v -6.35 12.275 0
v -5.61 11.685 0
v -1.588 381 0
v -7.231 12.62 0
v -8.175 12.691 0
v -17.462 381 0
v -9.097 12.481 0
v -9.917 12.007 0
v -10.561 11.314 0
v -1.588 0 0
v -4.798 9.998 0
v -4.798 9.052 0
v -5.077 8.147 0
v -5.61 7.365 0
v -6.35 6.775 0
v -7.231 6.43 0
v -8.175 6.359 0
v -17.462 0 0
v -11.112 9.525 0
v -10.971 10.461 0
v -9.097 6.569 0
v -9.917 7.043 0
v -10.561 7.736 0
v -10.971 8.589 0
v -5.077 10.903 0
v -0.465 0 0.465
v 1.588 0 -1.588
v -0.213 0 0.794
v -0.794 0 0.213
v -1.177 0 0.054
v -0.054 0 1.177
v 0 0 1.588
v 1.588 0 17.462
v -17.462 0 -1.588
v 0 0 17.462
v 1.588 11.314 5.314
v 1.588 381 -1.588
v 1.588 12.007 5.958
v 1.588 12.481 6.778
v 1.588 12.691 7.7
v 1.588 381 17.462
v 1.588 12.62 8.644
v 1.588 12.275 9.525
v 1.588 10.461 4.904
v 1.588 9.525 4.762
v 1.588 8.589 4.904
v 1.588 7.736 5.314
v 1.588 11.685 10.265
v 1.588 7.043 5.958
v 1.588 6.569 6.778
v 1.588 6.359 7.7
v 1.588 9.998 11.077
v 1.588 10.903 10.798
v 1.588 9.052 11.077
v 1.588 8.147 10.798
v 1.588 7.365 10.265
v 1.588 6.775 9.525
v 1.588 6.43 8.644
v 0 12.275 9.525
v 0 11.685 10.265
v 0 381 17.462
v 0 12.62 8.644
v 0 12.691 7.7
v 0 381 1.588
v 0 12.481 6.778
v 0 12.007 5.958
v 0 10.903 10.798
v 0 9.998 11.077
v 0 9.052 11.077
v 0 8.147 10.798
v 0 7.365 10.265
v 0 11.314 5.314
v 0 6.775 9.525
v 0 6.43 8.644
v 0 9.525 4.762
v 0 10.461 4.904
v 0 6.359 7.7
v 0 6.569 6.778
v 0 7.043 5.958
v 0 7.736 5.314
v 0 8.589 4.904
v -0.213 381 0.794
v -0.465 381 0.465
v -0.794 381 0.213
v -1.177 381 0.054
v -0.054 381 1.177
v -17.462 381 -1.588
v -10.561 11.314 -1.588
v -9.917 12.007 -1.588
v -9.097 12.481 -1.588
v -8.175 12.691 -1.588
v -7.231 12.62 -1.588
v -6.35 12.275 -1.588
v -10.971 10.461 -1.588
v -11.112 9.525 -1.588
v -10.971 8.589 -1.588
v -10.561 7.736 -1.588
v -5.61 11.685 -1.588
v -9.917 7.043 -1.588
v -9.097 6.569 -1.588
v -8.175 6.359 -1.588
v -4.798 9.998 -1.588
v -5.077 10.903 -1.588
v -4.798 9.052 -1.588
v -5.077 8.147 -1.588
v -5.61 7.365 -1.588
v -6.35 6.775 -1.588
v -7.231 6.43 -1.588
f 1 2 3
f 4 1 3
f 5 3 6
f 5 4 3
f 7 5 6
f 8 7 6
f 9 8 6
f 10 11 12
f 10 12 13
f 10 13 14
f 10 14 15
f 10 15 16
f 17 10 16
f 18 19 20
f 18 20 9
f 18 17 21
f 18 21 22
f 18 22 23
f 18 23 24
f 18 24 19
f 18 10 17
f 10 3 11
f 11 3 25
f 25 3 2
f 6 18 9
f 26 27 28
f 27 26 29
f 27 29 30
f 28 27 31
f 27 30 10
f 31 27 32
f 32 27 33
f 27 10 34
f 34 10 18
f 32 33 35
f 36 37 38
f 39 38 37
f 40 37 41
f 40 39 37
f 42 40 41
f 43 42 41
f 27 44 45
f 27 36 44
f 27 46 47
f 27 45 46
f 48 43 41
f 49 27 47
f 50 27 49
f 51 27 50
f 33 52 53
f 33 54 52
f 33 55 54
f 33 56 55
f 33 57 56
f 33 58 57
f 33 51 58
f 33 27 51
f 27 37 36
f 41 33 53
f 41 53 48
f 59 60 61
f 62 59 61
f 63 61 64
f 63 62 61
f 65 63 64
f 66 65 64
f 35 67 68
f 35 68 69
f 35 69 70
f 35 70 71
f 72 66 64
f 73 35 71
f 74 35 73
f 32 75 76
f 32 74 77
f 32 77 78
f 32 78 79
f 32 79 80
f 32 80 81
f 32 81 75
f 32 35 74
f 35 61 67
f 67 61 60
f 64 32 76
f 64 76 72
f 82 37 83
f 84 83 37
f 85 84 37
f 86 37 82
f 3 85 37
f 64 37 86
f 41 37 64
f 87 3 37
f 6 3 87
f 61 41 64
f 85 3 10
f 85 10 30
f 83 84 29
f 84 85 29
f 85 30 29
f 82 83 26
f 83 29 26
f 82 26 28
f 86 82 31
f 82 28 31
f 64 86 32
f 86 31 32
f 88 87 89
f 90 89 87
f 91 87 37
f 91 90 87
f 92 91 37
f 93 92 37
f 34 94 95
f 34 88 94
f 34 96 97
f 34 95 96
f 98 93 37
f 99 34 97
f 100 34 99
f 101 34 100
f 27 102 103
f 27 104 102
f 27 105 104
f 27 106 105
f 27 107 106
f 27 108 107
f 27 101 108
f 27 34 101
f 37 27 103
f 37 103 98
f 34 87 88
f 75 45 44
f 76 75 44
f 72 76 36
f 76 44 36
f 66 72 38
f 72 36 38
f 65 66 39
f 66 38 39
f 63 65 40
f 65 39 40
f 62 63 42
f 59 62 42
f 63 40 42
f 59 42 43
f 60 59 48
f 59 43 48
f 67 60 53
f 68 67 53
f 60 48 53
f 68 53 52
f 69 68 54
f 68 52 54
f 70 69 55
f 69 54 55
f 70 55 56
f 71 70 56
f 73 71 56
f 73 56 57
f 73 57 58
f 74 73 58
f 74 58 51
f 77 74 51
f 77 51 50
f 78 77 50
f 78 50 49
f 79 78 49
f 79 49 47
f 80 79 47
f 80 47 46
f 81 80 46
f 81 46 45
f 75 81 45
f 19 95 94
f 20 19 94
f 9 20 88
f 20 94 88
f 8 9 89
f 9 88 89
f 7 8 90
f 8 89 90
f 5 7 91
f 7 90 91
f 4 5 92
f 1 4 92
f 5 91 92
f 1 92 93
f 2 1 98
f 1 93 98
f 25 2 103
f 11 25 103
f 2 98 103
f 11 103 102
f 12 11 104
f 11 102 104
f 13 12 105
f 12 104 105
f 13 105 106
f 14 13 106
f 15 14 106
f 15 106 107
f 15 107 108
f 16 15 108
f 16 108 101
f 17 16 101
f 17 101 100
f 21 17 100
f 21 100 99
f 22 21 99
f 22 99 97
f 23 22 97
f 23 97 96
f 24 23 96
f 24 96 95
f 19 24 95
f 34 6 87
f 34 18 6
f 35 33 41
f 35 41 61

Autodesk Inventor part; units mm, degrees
ref_plane "YZ Plane" through (0, 0, 0) normal (1, 0, 0) x (0, 1, 0)
ref_plane "XZ Plane" through (0, 0, 0) normal (0, 1, 0) x (-1, 0, 0)
ref_plane "XY Plane" through (0, 0, 0) normal (0, 0, 1) x (1, 0, 0)
sketch "Sketch1" plane through (0, 0, 0) normal (0, 1, 0) x (-1, 0, 0)
  line L0 (0, 17.4625) -> (0, 1.5875)
  line L1 (1.5875, 0) -> (17.4625, 0)
  line L2 (17.4625, 0) -> (17.4625, -1.5875)
  line L3 (17.4625, -1.5875) -> (-1.5875, -1.5875)
  line L4 (-1.5875, -1.5875) -> (-1.5875, 17.4625)
  line L5 (-1.5875, 17.4625) -> (0, 17.4625)
  arc A0 (0, 1.5875) -> (1.5875, 0) centre (1.5875, 1.5875) ccw
  point P0 (0, 0)
  dimension "d0" = 1.5875
  dimension "d1" = 19.05
  dimension "d2" = 1.5875
extrude "Extrusion1" add sketch "Sketch1" along normal blind 381
sketch "Sketch2" plane through (1.5875, 0, -1.5875) normal (0, 0, -1) x (-1, 0, 0)
  line L0 (19.05, 0) -> (0, 0) construction
  line L1 (9.525, 0) -> (9.525, 443.5725) construction
  circle A0 centre (9.525, 9.525) radius 3.175
  point P0 (1.5875, 0)
  dimension "d5" = 6.35
  dimension "d6" = 9.525
extrude "Extrusion2" cut sketch "Sketch2" against normal through all
sketch "Sketch3" plane through (1.5875, 0, 17.4625) normal (1, 0, 0) x (0, 0, -1)
  line L0 (19.05, 0) -> (0, 0) construction
  line L1 (9.525, 0) -> (9.525, 23.4407) construction
  circle A0 centre (9.525, 9.525) radius 3.175
  point P0 (17.4625, 0)
  dimension "d9" = 6.35
  dimension "d10" = 9.525
extrude "Extrusion3" cut sketch "Sketch3" against normal through all
properties part number "Short Wall support" material "Aluminum 6061"
